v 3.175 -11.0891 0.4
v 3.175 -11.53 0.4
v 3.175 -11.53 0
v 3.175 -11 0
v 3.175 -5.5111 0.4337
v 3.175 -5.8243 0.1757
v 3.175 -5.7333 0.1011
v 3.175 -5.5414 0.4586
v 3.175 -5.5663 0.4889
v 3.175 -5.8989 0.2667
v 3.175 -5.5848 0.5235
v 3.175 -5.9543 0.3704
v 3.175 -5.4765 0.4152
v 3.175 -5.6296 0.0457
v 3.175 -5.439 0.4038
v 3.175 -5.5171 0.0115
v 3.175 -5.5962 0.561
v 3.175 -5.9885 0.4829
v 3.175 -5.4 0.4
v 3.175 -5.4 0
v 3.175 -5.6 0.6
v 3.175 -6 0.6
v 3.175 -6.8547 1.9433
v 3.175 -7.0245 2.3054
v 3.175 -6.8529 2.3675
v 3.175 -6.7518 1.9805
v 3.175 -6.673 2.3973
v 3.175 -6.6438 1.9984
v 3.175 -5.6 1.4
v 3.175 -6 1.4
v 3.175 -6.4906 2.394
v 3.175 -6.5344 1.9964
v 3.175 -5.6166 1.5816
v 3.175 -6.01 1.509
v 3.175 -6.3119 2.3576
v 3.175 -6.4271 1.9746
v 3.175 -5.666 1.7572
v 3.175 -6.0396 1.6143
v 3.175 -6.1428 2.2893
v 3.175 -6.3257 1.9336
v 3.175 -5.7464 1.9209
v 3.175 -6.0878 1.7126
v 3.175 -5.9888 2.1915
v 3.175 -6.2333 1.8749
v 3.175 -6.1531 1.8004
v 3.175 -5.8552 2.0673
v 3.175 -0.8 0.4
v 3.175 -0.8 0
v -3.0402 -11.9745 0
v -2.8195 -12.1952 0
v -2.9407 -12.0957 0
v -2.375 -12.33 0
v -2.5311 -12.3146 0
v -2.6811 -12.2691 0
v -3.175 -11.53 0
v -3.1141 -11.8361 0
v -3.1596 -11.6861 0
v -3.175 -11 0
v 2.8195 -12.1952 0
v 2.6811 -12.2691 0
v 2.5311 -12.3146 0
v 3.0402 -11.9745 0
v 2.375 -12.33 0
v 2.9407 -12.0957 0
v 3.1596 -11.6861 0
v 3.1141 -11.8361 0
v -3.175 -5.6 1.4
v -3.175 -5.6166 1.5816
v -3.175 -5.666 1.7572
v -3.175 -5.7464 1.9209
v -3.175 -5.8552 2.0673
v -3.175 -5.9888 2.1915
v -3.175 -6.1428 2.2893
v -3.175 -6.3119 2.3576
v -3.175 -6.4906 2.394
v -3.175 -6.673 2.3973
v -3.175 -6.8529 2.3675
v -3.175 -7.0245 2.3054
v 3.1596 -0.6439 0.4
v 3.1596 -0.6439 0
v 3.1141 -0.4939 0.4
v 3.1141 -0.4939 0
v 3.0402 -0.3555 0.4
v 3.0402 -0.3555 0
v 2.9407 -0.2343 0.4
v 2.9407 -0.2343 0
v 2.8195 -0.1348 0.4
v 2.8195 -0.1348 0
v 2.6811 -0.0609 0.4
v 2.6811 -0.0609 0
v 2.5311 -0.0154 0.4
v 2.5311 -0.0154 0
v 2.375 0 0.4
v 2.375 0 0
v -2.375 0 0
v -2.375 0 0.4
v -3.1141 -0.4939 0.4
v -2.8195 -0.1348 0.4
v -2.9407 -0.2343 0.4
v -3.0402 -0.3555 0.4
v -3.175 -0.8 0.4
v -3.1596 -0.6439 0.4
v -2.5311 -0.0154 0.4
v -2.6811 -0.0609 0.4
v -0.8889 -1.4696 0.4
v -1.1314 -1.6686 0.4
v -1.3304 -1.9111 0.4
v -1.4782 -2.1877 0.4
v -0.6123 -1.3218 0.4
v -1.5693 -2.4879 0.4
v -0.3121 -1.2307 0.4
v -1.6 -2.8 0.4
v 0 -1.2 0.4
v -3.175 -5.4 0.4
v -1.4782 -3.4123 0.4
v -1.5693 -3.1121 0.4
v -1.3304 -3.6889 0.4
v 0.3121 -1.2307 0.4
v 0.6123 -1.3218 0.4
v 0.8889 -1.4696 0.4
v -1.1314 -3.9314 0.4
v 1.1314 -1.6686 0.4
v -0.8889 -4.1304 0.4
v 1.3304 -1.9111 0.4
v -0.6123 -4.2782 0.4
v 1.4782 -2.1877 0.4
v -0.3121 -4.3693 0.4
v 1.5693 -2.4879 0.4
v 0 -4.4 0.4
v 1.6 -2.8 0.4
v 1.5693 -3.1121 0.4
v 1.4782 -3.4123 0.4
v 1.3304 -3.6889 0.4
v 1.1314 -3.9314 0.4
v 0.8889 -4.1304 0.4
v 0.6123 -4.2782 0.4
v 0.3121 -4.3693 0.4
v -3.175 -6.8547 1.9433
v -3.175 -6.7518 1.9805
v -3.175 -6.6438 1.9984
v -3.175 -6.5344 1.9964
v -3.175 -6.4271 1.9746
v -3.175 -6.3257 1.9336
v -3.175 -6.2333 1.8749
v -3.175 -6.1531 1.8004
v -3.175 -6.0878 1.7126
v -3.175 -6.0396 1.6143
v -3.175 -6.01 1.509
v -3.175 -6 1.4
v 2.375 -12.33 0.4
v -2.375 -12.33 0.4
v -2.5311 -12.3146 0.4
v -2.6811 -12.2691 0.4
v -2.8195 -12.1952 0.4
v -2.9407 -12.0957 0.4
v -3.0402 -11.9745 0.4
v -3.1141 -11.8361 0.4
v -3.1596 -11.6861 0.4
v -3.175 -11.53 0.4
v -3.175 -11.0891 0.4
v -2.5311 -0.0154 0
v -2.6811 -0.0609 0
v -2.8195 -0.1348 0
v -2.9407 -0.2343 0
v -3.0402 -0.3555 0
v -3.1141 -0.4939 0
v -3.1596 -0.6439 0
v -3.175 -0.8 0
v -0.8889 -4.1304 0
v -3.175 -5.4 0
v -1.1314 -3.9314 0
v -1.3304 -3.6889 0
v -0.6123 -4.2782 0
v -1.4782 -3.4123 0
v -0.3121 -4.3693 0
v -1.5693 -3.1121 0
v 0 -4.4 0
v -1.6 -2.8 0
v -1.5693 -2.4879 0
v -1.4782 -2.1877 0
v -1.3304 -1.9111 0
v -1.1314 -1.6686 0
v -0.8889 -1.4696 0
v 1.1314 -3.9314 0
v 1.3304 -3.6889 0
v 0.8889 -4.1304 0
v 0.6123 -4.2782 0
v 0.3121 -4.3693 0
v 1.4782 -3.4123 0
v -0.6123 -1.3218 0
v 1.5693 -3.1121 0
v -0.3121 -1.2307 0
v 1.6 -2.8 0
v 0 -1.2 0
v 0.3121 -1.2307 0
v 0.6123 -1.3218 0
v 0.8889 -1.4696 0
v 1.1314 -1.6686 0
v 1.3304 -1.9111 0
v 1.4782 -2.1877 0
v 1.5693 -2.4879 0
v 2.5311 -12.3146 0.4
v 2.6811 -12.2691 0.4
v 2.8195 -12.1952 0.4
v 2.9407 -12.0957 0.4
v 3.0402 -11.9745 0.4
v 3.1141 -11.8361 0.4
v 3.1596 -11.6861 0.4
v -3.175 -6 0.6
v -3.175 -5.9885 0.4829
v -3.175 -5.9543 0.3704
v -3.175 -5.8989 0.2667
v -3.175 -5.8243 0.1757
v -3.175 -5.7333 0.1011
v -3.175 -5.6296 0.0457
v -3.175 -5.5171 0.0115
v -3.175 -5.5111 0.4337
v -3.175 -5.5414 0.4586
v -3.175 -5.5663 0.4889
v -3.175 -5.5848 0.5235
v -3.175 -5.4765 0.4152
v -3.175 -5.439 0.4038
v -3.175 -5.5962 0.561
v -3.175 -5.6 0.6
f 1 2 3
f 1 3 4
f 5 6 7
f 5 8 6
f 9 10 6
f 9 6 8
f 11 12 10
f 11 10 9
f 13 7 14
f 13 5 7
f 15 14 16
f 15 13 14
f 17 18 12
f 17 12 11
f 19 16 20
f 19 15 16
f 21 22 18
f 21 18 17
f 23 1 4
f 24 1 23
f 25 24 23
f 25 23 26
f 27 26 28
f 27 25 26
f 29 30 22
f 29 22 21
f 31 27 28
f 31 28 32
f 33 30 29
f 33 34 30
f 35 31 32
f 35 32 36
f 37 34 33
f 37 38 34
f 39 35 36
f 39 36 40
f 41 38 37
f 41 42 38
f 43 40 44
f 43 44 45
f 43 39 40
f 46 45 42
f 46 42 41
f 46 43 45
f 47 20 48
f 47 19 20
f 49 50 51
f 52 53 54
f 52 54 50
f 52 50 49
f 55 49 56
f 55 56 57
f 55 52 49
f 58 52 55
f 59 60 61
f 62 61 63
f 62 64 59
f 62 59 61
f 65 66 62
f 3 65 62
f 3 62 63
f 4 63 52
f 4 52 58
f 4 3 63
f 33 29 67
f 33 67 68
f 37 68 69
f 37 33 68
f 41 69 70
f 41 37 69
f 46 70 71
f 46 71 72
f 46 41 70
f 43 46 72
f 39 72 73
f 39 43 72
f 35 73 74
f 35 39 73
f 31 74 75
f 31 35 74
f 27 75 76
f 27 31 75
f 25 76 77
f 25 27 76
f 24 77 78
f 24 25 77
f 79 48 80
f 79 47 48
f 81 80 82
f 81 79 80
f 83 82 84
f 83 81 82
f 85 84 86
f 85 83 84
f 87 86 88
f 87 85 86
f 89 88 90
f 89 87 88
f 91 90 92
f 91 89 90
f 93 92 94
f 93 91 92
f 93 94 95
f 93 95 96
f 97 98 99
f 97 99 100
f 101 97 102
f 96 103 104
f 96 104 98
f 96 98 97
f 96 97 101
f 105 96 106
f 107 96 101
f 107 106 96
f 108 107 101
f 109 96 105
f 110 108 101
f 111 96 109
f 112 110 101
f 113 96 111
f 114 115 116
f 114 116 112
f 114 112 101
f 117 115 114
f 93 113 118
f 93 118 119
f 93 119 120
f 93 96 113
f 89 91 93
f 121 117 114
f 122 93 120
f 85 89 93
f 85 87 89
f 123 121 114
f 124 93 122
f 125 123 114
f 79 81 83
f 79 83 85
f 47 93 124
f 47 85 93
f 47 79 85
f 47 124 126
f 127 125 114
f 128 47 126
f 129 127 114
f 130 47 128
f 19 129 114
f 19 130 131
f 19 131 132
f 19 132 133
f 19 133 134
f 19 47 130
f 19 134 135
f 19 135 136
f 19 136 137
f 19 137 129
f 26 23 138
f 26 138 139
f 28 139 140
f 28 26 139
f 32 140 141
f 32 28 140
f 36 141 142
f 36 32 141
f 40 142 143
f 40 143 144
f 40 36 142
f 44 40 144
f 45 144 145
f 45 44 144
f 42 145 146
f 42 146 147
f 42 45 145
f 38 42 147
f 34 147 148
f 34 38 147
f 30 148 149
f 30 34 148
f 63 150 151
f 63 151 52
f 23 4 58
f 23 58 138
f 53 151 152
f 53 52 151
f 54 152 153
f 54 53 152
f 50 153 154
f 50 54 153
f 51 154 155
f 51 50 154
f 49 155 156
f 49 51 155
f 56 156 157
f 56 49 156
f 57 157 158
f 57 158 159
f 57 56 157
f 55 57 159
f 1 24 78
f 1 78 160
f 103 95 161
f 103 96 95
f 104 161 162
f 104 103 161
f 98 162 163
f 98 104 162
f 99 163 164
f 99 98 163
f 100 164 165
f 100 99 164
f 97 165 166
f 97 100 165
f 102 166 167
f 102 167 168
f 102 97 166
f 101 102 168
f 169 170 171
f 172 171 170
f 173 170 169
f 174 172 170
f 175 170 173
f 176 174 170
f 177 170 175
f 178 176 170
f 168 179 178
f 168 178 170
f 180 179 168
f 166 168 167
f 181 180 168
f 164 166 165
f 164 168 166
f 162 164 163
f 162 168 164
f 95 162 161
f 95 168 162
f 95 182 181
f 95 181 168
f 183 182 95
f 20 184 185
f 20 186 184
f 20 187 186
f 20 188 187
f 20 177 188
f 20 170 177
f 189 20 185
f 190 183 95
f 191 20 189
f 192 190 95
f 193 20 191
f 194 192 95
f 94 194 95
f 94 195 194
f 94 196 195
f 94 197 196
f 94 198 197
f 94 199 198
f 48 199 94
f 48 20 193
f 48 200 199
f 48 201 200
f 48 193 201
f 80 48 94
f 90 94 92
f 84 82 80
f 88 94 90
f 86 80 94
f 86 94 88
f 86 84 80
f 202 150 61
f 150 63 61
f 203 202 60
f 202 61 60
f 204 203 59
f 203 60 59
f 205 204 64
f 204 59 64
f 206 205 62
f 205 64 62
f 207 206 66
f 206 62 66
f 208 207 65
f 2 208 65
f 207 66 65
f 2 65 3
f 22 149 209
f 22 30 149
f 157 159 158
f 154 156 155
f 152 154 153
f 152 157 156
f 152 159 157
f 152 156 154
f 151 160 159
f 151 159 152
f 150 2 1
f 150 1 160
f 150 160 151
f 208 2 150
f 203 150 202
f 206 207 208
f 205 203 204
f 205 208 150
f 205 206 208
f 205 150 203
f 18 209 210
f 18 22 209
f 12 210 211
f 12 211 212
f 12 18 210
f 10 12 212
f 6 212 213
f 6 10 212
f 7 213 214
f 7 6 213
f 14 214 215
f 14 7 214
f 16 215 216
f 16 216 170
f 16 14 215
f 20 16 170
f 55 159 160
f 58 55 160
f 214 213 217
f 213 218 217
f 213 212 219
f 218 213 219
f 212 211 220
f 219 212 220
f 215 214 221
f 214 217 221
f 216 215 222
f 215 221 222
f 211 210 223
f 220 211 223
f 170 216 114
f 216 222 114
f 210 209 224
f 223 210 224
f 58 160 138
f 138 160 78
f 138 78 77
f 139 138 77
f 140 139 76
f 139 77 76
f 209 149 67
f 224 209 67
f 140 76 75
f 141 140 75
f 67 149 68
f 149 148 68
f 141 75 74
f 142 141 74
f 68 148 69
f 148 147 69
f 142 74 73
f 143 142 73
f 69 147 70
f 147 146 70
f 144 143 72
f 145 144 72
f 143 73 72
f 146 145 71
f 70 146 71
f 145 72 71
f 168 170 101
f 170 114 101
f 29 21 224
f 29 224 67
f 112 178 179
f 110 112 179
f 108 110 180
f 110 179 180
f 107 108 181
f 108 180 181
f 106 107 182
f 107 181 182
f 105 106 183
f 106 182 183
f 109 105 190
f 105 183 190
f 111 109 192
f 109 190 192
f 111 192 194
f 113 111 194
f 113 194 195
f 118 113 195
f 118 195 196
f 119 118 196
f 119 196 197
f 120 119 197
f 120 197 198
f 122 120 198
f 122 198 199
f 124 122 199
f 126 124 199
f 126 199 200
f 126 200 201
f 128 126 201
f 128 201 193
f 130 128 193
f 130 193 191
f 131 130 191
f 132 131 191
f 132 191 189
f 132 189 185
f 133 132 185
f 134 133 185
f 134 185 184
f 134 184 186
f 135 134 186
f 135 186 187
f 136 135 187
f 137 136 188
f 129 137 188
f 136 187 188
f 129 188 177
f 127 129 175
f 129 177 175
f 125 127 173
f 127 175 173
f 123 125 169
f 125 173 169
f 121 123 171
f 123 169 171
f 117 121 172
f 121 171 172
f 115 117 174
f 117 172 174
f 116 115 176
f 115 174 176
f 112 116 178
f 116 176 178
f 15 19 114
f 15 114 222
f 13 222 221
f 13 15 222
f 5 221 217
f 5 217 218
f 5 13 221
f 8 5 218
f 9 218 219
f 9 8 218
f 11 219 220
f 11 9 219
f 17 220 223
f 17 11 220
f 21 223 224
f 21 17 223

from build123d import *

# Parameters (mm, degrees)
F1_DEPTH = 3.175
F2_R     = 0.8
F4_D     = 3.2


with BuildPart() as f1:
    # F0 (on Right) → F1 (new body, symmetric)
    with BuildSketch(Plane.YZ):
        with BuildLine():
            Line((-5.4, 0), (0, 0))
            Line((0, 0), (0, 0.4))
            Line((0, 0.4), (-5.4, 0.4))
            ThreePointArc((-5.4, 0.4), (-5.541421, 0.458579), (-5.6, 0.6))
            Line((-5.6, 0.6), (-5.6, 1.4))
            ThreePointArc((-5.6, 1.4), (-6.063558, 2.243937), (-7.02446, 2.305447))
            Line((-7.02446, 2.305447), (-11.089105, 0.4))
            Line((-11.089105, 0.4), (-12.33, 0.4))
            Line((-12.33, 0.4), (-12.33, 0))
            Line((-12.33, 0), (-11, 0))
            Line((-11, 0), (-6.854676, 1.943268))
            ThreePointArc((-6.854676, 1.943268), (-6.278135, 1.906362), (-6, 1.4))
            Line((-6, 1.4), (-6, 0.6))
            ThreePointArc((-6, 0.6), (-5.824264, 0.175736), (-5.4, 0))
        make_face()
    extrude(amount=F1_DEPTH, both=True)

    # F2
    f2_edges = [f1.edges().sort_by_distance(p)[0] for p in [
        (3.175, -12.33, 0.2),
        (-3.175, -12.33, 0.2),
        (3.175, 0, 0.2),
        (-3.175, 0, 0.2),
    ]]
    fillet(f2_edges, radius=F2_R)

    # F4 (through all)
    with Locations(Plane.XY.offset(0.4)):
        with Locations((0, -2.8)):
            Hole(F4_D / 2)


solid = f1.part
